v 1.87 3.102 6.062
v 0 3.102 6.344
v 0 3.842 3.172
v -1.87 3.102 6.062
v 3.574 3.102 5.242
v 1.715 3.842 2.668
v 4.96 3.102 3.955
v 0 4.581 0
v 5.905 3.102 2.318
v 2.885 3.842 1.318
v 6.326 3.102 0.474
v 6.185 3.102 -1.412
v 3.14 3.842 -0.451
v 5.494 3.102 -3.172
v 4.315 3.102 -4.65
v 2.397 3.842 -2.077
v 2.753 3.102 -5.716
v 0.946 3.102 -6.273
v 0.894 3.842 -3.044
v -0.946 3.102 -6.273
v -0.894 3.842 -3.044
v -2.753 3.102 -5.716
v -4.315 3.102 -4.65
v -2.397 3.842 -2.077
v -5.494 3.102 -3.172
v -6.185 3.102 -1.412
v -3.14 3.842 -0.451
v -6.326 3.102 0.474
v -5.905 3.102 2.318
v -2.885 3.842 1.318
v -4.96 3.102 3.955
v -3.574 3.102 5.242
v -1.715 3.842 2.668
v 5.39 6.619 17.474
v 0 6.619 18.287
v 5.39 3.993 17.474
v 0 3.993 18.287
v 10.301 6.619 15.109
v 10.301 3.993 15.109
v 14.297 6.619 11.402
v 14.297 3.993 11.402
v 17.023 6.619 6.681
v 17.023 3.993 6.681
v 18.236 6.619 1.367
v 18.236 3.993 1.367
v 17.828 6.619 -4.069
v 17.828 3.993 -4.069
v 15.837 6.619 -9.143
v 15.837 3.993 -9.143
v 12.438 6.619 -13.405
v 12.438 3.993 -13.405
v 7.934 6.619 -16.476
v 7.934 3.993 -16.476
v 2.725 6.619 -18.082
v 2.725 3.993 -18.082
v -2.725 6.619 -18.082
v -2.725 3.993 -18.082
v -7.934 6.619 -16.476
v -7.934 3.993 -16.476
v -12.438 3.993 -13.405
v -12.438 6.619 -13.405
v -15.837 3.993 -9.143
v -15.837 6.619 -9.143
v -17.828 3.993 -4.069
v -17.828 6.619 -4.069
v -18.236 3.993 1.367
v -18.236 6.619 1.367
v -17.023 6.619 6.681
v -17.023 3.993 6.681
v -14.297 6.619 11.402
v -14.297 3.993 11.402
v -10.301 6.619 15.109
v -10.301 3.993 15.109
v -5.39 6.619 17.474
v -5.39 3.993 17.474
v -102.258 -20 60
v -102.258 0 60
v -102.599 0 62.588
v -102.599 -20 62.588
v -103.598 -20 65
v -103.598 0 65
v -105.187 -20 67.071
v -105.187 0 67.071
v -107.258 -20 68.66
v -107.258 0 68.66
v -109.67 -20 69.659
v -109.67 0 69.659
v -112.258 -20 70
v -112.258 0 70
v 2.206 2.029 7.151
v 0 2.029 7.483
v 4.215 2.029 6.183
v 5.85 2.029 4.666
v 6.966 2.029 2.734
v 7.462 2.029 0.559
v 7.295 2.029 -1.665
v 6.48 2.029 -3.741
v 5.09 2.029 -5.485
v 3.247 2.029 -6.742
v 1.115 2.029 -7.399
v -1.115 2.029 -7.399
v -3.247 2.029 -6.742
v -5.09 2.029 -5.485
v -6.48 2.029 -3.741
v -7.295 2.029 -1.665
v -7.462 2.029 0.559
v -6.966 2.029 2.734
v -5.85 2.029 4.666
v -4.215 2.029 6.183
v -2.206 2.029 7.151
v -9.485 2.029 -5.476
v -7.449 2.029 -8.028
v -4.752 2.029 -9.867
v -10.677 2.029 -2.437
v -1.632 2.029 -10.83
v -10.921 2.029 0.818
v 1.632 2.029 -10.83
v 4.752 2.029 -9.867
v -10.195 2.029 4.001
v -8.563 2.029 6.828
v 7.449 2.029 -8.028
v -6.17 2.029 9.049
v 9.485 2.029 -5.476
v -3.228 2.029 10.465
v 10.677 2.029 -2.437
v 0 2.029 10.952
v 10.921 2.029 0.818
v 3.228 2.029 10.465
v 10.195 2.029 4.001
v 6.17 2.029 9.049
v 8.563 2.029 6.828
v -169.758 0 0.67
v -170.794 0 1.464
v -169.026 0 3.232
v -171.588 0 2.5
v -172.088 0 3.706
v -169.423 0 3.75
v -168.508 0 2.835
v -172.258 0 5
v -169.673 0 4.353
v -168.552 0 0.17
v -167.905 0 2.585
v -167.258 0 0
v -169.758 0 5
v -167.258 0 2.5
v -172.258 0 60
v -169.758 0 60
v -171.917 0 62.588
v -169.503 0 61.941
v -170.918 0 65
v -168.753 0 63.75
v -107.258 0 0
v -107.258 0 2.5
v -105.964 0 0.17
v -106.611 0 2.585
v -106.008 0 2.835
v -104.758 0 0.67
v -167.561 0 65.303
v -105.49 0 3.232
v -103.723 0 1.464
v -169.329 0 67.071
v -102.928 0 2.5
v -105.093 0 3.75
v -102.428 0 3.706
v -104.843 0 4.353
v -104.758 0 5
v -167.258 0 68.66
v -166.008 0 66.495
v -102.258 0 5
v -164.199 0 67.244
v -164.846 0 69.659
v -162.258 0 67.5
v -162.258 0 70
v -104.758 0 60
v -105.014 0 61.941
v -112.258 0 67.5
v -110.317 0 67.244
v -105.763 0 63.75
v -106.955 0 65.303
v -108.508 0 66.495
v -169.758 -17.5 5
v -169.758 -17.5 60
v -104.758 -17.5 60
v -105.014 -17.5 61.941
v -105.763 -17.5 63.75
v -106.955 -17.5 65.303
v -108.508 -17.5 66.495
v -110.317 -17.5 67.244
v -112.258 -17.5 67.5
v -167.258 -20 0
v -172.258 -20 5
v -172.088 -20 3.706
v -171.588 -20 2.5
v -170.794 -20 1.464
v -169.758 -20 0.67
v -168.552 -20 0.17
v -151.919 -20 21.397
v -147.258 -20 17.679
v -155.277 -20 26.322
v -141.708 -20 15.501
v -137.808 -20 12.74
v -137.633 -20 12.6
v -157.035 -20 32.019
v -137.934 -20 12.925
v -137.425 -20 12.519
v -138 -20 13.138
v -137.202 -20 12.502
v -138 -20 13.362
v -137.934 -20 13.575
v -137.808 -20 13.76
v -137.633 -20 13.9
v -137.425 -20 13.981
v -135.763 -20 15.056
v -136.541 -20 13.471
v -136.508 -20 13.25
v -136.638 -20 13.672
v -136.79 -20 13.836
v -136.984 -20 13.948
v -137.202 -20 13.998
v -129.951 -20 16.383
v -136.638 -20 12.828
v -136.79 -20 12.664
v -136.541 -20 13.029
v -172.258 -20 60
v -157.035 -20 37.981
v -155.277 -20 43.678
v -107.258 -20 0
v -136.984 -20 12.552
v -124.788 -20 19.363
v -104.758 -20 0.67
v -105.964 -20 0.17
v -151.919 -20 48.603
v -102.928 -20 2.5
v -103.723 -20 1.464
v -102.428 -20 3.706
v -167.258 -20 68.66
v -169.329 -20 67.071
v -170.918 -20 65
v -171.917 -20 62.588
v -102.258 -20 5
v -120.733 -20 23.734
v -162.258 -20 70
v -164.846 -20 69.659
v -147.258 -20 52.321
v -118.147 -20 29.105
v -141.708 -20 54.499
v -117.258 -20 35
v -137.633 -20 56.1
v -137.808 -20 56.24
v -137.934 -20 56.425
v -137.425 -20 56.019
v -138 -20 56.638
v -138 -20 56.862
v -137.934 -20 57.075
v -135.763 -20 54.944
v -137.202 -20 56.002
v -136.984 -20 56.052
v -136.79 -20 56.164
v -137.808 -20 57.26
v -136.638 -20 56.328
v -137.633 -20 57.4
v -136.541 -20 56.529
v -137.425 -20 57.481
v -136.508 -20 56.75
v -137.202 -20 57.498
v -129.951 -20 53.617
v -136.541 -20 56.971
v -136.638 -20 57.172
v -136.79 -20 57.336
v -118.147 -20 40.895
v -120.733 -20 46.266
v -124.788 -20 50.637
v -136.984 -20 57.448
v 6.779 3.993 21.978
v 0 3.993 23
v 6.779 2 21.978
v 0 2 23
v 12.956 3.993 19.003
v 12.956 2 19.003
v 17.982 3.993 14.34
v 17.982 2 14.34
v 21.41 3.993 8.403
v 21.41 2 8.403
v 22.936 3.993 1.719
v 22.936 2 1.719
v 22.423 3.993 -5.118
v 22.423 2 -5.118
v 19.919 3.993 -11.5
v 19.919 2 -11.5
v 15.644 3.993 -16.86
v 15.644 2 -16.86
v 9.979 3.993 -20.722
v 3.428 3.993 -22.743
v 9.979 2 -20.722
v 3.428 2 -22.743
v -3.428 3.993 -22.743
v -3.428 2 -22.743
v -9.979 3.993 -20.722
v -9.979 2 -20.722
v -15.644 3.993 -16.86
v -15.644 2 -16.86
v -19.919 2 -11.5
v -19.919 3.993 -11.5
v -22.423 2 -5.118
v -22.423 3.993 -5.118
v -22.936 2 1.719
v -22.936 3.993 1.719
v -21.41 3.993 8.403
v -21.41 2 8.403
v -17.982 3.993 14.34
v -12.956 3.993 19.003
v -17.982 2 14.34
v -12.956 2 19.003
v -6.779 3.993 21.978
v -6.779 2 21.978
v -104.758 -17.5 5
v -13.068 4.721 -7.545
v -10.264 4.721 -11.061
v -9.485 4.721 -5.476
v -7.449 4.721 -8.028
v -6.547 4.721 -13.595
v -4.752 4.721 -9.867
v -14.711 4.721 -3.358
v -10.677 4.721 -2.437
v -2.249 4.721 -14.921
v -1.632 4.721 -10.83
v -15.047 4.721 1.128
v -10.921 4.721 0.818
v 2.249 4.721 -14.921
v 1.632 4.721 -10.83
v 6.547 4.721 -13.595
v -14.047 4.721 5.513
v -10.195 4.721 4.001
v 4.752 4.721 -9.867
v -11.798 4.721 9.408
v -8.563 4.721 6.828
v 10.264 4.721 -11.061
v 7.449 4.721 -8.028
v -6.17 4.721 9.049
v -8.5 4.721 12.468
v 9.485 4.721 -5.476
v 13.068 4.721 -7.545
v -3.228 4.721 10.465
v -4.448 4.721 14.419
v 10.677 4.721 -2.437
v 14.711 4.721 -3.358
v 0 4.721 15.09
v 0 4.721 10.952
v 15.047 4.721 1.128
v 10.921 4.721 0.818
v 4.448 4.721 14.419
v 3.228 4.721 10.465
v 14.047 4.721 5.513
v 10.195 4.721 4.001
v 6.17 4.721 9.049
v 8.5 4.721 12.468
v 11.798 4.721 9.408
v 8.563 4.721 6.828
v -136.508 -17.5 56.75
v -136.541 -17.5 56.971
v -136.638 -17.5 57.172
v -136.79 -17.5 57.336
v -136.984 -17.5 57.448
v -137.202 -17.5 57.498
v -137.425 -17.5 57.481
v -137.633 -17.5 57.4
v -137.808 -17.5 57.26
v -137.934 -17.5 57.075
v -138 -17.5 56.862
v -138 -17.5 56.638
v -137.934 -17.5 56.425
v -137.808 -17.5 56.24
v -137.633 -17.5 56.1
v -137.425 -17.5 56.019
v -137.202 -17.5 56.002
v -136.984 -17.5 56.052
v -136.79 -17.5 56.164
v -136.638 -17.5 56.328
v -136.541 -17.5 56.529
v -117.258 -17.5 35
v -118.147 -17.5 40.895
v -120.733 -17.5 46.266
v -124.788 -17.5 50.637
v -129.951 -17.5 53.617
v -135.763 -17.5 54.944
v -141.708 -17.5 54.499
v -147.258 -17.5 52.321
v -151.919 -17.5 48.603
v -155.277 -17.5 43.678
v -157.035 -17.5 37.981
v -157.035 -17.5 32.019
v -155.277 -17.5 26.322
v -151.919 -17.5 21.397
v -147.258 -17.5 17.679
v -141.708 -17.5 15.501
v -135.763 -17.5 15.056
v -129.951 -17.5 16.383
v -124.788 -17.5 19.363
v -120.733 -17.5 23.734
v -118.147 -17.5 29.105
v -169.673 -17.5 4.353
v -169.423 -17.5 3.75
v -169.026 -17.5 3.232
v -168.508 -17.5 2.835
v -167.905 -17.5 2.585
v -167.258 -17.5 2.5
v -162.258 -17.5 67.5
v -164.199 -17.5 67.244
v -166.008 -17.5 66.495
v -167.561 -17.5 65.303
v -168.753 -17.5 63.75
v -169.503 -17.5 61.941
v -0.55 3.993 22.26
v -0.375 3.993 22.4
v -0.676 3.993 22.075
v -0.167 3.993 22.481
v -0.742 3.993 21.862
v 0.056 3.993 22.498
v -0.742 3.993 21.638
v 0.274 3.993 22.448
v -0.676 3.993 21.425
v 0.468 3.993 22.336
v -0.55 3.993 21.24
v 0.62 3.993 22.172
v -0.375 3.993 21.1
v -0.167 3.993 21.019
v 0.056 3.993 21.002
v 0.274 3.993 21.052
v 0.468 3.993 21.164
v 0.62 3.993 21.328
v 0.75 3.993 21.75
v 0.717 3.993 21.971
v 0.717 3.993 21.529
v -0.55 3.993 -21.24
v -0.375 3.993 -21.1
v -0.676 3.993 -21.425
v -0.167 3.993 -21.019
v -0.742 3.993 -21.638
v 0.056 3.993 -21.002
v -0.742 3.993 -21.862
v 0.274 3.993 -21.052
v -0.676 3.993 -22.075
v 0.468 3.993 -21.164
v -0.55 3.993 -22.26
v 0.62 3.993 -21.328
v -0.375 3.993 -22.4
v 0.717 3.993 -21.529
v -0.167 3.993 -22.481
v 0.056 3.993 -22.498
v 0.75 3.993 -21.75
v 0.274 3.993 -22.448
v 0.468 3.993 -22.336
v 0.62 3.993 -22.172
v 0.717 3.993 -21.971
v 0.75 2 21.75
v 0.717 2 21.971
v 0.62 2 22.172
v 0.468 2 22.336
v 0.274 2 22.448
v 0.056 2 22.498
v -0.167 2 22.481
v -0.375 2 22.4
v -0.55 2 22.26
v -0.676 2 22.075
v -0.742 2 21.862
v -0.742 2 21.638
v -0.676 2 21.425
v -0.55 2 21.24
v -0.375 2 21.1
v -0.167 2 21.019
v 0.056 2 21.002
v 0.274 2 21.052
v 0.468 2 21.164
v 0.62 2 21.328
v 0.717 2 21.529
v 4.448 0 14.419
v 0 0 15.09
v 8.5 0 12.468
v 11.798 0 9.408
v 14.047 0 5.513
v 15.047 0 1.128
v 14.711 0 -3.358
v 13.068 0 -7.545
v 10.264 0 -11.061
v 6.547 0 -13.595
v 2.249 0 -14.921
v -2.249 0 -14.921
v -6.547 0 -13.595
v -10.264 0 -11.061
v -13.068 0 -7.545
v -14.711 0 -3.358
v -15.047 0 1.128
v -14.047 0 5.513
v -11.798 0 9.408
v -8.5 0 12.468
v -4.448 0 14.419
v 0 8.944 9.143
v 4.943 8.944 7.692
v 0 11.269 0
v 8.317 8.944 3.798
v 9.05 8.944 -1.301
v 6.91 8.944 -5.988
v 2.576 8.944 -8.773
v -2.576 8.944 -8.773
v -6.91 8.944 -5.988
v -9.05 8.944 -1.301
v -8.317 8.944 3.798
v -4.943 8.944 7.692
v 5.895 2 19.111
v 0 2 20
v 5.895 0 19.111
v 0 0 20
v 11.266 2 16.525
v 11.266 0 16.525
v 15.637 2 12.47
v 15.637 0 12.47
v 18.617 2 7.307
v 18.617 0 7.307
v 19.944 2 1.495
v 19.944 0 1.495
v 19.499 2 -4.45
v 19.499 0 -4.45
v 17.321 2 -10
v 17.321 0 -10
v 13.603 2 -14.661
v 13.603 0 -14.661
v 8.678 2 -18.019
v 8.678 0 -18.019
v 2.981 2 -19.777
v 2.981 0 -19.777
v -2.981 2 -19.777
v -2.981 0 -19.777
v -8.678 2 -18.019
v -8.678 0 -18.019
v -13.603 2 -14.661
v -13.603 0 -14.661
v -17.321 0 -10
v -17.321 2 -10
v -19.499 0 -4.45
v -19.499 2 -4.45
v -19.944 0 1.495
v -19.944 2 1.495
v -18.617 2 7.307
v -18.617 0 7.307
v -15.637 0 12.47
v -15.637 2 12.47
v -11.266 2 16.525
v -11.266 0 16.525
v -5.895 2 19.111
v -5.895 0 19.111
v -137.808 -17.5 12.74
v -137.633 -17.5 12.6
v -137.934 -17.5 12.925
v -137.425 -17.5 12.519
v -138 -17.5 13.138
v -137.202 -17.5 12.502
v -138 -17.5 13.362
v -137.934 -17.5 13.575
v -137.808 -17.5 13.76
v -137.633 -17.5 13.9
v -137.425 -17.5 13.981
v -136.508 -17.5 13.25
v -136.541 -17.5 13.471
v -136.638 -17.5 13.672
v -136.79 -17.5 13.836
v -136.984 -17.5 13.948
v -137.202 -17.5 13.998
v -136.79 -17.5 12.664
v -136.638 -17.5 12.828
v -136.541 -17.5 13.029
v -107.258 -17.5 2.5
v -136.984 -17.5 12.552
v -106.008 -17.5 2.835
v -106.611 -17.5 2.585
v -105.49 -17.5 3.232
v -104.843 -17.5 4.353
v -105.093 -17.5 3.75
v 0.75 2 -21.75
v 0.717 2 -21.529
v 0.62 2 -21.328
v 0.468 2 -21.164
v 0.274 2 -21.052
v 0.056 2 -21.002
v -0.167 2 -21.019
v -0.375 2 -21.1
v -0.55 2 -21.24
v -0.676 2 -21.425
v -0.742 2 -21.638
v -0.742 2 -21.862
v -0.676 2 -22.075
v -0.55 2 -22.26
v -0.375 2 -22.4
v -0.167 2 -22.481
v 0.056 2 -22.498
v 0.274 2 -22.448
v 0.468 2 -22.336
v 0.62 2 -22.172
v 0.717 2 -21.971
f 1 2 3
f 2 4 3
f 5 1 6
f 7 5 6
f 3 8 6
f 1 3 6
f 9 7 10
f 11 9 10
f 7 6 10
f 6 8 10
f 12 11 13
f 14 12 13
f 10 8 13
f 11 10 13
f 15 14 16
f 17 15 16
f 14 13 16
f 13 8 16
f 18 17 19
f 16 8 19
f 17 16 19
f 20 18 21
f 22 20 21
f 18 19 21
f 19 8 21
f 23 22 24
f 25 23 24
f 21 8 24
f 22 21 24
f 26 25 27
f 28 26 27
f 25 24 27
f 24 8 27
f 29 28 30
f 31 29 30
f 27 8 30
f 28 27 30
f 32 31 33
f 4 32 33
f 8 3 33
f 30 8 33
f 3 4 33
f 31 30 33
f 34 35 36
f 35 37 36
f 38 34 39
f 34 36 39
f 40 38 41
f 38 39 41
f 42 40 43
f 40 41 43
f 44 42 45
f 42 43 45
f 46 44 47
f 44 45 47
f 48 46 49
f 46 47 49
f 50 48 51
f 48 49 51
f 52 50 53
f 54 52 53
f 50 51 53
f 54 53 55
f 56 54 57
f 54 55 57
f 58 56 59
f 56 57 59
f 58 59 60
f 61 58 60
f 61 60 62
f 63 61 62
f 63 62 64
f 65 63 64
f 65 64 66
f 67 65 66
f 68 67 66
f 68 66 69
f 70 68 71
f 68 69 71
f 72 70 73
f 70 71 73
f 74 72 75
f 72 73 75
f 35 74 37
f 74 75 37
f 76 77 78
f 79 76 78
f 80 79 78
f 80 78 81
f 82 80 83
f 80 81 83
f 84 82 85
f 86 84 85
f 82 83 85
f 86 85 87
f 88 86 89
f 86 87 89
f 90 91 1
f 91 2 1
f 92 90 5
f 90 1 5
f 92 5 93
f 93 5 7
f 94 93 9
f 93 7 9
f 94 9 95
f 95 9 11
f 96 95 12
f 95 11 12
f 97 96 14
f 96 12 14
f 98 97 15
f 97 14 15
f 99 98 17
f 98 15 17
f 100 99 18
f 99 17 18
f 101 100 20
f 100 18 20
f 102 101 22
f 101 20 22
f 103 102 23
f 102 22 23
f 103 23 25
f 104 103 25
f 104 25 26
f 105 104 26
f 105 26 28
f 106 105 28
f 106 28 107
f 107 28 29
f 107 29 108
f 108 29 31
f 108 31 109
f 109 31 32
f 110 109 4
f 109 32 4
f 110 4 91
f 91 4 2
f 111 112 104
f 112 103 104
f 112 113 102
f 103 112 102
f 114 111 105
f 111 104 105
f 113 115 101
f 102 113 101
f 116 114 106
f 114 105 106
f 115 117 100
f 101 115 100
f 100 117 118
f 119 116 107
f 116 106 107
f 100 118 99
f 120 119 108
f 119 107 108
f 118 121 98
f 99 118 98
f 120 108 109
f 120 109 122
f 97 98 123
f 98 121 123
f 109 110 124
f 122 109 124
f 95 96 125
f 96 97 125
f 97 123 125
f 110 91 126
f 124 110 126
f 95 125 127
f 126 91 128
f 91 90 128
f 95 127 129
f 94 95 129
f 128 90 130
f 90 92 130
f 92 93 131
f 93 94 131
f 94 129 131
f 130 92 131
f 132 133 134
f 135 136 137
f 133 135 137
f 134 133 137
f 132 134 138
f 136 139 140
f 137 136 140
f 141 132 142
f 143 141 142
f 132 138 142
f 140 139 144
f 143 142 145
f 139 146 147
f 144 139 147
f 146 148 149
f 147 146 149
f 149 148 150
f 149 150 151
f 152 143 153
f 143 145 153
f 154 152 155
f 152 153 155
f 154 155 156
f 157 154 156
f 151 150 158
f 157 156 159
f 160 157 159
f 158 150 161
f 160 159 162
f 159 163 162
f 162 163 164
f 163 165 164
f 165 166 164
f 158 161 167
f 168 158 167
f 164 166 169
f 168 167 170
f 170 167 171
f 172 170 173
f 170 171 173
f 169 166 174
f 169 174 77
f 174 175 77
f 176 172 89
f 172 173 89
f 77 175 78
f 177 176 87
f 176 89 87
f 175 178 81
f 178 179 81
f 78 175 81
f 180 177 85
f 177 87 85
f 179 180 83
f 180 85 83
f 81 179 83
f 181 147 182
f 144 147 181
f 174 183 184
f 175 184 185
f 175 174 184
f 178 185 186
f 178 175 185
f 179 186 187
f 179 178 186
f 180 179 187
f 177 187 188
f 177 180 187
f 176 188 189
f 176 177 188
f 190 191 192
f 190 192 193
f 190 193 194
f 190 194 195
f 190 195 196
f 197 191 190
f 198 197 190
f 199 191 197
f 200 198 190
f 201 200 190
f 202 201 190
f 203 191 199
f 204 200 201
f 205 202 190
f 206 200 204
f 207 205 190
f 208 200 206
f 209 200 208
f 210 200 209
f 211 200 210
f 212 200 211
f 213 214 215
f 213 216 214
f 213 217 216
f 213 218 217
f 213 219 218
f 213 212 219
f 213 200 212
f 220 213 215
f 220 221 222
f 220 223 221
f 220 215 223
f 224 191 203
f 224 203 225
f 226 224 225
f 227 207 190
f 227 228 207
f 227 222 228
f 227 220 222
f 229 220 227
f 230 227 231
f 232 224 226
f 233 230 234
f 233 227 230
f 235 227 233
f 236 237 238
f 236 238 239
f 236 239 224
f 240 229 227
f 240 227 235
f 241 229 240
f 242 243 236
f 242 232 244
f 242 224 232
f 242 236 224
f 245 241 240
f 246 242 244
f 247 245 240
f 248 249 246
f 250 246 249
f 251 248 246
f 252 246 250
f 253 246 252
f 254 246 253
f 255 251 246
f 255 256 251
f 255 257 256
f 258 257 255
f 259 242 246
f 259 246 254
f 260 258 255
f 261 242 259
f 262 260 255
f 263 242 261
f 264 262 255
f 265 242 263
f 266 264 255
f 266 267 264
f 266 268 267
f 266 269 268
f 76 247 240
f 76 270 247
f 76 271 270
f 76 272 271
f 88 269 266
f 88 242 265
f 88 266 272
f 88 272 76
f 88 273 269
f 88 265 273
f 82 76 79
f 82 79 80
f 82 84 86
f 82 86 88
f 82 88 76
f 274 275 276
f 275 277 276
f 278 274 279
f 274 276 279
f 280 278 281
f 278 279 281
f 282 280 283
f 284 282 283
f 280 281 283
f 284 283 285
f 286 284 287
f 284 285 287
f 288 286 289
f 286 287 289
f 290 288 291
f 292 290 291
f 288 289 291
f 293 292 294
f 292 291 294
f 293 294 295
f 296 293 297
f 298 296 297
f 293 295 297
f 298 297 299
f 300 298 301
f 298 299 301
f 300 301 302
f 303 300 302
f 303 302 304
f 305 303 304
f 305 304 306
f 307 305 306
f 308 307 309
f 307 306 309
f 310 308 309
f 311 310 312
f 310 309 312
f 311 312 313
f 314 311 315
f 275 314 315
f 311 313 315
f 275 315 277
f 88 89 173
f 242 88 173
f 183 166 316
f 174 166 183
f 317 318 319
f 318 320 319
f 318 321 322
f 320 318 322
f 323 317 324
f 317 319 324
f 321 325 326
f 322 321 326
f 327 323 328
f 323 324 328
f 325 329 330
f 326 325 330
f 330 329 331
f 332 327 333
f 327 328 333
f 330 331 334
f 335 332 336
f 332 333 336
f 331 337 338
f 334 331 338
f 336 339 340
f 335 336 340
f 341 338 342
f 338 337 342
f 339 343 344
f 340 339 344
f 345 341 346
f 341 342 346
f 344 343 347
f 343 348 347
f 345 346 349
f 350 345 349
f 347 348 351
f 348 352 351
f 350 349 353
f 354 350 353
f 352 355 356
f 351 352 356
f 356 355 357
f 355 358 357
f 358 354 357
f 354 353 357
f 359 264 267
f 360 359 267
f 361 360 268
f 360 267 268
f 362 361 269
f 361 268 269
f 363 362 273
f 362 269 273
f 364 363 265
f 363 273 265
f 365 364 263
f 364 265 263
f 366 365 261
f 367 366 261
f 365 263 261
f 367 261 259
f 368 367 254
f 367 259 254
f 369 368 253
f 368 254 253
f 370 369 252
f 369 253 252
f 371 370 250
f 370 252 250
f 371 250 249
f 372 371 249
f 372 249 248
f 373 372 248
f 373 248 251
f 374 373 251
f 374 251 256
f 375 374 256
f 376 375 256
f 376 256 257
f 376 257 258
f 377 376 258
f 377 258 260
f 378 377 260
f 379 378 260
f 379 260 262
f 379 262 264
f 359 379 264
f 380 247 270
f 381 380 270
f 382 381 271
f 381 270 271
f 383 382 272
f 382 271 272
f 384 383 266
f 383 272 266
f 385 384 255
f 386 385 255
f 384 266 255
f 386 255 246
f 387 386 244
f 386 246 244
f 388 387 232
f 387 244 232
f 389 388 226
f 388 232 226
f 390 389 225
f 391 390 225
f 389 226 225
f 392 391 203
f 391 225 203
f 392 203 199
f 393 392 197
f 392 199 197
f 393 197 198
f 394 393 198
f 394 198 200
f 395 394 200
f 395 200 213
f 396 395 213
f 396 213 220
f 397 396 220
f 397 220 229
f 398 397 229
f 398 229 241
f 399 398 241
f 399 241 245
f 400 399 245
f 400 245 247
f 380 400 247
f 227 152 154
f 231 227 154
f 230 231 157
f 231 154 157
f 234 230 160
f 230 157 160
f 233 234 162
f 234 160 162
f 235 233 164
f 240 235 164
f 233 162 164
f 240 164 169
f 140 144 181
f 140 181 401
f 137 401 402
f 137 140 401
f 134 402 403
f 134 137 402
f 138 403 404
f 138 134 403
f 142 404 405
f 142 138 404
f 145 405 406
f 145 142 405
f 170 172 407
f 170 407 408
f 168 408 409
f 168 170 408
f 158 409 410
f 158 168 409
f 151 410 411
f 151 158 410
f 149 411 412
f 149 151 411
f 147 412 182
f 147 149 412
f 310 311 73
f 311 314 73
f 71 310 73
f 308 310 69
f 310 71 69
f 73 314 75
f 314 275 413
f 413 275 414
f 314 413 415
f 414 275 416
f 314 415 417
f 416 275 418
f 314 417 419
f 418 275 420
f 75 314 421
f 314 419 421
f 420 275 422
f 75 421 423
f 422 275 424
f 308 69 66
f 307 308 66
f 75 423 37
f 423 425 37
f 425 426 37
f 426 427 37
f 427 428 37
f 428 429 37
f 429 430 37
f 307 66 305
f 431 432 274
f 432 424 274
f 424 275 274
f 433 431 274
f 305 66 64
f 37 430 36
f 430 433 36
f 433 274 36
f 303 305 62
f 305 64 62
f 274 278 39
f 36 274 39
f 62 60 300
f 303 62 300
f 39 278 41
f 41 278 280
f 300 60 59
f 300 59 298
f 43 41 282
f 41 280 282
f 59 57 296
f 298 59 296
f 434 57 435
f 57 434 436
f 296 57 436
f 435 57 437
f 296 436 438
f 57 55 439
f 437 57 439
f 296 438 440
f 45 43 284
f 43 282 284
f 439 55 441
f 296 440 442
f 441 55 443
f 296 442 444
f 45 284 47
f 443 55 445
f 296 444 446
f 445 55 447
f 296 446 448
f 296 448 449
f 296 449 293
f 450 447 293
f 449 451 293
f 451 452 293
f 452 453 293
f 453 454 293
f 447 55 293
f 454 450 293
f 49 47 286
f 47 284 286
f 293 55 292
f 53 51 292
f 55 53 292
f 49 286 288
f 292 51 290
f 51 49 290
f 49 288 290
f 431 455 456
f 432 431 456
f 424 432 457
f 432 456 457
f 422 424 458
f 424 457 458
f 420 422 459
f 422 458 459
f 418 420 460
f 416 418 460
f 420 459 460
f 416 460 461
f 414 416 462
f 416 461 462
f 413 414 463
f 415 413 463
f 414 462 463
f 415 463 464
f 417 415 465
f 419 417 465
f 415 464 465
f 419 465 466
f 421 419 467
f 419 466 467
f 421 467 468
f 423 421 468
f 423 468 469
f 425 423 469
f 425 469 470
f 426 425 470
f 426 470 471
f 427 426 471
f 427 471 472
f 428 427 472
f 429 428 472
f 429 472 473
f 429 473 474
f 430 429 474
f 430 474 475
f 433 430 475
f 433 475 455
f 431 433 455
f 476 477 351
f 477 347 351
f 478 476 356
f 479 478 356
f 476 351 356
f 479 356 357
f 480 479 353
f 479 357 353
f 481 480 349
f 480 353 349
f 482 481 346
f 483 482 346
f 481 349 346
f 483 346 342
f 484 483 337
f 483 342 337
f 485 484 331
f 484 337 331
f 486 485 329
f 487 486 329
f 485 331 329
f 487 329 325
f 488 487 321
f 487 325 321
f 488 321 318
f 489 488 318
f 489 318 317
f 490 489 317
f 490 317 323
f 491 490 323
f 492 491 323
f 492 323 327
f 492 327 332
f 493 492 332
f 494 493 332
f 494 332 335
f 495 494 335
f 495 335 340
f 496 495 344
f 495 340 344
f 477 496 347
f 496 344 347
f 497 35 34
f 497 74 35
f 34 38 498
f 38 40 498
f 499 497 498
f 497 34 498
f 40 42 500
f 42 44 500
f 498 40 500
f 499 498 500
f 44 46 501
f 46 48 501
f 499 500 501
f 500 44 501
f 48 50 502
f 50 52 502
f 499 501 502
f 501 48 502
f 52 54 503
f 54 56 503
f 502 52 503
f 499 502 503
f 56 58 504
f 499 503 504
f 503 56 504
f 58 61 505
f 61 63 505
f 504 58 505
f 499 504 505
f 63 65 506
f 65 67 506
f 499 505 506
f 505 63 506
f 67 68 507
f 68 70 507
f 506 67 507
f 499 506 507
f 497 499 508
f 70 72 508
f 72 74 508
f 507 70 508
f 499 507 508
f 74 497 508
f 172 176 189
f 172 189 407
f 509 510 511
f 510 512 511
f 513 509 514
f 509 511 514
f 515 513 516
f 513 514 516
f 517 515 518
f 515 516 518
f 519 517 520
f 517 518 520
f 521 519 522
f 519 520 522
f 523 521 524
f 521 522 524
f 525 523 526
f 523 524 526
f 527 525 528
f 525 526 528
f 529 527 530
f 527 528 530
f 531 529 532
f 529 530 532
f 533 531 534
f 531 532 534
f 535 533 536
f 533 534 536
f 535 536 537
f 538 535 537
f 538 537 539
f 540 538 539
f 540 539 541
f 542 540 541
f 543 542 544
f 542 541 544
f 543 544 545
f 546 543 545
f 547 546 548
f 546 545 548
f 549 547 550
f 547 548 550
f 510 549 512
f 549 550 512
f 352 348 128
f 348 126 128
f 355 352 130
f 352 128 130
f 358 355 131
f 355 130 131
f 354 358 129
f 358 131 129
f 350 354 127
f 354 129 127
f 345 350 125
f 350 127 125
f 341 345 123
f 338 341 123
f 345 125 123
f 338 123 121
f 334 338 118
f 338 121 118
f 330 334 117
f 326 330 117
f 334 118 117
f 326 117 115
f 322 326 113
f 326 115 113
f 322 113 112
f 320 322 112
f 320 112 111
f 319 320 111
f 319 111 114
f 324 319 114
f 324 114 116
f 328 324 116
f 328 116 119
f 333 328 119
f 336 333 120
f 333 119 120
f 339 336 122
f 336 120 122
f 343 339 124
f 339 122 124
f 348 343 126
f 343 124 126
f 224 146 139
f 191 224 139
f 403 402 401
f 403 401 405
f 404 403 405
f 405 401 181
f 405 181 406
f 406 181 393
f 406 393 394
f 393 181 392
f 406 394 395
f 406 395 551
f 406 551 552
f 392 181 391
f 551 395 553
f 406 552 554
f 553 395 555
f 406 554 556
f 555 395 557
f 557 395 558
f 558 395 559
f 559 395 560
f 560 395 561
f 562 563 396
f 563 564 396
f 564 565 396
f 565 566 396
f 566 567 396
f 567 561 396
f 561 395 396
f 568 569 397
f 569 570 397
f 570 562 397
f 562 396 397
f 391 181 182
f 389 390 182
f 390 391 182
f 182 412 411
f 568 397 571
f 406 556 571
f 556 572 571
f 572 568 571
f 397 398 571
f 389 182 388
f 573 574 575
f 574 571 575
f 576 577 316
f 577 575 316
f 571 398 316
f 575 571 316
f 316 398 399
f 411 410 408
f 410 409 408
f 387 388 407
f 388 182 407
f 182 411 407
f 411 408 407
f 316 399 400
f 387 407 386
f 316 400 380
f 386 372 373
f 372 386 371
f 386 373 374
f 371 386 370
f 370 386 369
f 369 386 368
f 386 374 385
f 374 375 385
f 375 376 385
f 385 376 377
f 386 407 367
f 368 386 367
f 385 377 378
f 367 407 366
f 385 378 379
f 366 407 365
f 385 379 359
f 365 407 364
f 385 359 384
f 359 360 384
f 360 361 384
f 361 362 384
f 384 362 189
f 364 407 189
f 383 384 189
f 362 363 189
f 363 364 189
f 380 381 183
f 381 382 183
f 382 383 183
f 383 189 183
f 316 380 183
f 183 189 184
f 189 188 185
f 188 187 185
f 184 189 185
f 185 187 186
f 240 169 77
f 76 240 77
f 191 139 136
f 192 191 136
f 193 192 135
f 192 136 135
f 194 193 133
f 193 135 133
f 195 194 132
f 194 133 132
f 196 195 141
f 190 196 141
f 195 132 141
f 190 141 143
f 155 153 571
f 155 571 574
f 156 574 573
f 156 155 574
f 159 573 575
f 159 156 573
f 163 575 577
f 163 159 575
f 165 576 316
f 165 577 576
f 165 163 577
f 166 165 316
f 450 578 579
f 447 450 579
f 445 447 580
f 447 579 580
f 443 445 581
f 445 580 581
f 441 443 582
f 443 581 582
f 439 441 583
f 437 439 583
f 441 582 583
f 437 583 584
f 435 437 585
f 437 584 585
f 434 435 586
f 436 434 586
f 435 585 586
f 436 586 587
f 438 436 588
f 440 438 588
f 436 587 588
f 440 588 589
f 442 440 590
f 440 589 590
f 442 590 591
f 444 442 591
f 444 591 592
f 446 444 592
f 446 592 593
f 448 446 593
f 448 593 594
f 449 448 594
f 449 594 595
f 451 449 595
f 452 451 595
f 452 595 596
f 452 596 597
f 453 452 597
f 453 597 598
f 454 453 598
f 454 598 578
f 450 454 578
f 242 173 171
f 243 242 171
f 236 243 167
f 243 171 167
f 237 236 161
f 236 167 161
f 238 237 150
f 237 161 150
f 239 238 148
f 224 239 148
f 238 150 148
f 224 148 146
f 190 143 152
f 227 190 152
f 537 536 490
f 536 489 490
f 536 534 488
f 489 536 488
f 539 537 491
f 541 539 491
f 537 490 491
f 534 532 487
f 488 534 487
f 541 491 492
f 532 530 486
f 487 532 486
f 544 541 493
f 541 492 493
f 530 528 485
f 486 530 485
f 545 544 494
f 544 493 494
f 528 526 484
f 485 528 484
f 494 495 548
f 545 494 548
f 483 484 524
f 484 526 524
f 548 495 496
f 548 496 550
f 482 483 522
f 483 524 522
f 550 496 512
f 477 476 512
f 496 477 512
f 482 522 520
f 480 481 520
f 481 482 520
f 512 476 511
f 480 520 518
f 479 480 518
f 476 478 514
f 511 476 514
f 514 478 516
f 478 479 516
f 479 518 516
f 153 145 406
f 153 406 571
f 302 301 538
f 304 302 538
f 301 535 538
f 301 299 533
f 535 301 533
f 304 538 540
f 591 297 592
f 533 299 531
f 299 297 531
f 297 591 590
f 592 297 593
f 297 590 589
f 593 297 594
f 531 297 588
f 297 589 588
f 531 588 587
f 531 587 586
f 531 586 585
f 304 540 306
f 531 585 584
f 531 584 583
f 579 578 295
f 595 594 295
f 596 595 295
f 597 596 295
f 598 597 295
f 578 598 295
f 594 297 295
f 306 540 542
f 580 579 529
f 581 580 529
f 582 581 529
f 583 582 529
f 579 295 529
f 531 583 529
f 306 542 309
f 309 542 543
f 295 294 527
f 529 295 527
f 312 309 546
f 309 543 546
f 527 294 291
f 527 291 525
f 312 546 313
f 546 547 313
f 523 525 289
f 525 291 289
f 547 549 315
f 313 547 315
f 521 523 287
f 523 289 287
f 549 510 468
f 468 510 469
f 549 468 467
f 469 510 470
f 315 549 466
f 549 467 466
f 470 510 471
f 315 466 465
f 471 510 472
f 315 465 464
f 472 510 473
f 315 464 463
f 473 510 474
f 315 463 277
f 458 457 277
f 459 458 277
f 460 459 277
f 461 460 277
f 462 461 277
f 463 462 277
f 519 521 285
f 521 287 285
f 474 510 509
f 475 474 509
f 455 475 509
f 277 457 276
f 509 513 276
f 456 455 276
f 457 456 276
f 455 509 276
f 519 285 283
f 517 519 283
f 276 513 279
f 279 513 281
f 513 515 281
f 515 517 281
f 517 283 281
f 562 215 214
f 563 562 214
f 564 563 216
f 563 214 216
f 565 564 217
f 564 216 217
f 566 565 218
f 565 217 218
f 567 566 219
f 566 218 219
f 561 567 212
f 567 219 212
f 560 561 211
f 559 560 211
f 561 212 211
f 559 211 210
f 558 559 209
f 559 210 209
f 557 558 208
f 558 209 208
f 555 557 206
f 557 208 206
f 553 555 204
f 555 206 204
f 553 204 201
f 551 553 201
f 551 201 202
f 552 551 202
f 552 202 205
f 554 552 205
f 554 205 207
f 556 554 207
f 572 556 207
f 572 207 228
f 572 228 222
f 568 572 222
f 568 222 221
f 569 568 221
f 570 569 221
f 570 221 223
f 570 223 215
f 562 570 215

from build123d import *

# Parameters (mm, degrees)
F2_R      = 0.75
F3_DEPTH  = 25
F5_DEPTH  = 20
F6_T      = -2.5
F7_R      = 20
F8_DEPTH  = 25
F9_R      = 0.75
F10_DEPTH = 25


with BuildPart() as f1:
    # F0 (on Right) → F1 (revolve)
    with BuildSketch(Plane.YZ):
        Polygon((2, 20), (0, 20), (0, 15.089606), (2, 15.089606), (4.721145, 15.089606), (4.721145, 10.952036), (2.028715, 10.952036), (2.028715, 7.482993), (3.102437, 6.343979), (4.580645, 0), (6.88172, 0), (11.268836, 0), (6.619434, 18.28672), (3.992516, 18.28672), (3.992516, 19.735398), (3.992516, 23), (2, 23), align=None)
    revolve(axis=Axis((0, 5.731183, 0), (0, 1, 0)))

    # F2 (on face) → F3 (cut)
    with BuildSketch(Plane.XZ.offset(-2)):
        with Locations((0, 21.75)):
            Circle(F2_R)
        with Locations((0, -21.75)):
            Circle(F2_R)
    extrude(amount=-F3_DEPTH, mode=Mode.SUBTRACT)


with BuildPart() as f5:
    # F4 (on Front) → F5 (new body)
    with BuildSketch(Plane.XZ):
        with BuildLine():
            Line((-112.258063, 70), (-162.258063, 70))
            ThreePointArc((-162.258063, 70), (-169.329131, 67.071068), (-172.258063, 60))
            Line((-172.258063, 60), (-172.258063, 5))
            ThreePointArc((-172.258063, 5), (-170.793597, 1.464466), (-167.258063, 0))
            Line((-167.258063, 0), (-107.258063, 0))
            ThreePointArc((-107.258063, 0), (-103.722529, 1.464466), (-102.258063, 5))
            Line((-102.258063, 5), (-102.258063, 60))
            ThreePointArc((-102.258063, 60), (-105.186995, 67.071068), (-112.258063, 70))
        make_face()
    extrude(amount=F5_DEPTH)

    # F6
    f6_openings = [f5.faces().sort_by_distance(p)[0] for p in [
        (-137.258063, 0, 34.784833),
    ]]
    offset(amount=F6_T, openings=f6_openings)

    # F7 (on face) → F8 (cut)
    with BuildSketch(Plane.XZ.offset(20)):
        with Locations((-137.258063, 35)):
            Circle(F7_R)
    extrude(amount=-F8_DEPTH, mode=Mode.SUBTRACT)

    # F9 (on face) → F10 (cut)
    with BuildSketch(Plane.XZ.offset(20)):
        with Locations((-137.258063, 56.75)):
            Circle(F9_R)
        with Locations((-137.258063, 13.25)):
            Circle(F9_R)
    extrude(amount=-F10_DEPTH, mode=Mode.SUBTRACT)


solid = Compound([f1.part, f5.part])
